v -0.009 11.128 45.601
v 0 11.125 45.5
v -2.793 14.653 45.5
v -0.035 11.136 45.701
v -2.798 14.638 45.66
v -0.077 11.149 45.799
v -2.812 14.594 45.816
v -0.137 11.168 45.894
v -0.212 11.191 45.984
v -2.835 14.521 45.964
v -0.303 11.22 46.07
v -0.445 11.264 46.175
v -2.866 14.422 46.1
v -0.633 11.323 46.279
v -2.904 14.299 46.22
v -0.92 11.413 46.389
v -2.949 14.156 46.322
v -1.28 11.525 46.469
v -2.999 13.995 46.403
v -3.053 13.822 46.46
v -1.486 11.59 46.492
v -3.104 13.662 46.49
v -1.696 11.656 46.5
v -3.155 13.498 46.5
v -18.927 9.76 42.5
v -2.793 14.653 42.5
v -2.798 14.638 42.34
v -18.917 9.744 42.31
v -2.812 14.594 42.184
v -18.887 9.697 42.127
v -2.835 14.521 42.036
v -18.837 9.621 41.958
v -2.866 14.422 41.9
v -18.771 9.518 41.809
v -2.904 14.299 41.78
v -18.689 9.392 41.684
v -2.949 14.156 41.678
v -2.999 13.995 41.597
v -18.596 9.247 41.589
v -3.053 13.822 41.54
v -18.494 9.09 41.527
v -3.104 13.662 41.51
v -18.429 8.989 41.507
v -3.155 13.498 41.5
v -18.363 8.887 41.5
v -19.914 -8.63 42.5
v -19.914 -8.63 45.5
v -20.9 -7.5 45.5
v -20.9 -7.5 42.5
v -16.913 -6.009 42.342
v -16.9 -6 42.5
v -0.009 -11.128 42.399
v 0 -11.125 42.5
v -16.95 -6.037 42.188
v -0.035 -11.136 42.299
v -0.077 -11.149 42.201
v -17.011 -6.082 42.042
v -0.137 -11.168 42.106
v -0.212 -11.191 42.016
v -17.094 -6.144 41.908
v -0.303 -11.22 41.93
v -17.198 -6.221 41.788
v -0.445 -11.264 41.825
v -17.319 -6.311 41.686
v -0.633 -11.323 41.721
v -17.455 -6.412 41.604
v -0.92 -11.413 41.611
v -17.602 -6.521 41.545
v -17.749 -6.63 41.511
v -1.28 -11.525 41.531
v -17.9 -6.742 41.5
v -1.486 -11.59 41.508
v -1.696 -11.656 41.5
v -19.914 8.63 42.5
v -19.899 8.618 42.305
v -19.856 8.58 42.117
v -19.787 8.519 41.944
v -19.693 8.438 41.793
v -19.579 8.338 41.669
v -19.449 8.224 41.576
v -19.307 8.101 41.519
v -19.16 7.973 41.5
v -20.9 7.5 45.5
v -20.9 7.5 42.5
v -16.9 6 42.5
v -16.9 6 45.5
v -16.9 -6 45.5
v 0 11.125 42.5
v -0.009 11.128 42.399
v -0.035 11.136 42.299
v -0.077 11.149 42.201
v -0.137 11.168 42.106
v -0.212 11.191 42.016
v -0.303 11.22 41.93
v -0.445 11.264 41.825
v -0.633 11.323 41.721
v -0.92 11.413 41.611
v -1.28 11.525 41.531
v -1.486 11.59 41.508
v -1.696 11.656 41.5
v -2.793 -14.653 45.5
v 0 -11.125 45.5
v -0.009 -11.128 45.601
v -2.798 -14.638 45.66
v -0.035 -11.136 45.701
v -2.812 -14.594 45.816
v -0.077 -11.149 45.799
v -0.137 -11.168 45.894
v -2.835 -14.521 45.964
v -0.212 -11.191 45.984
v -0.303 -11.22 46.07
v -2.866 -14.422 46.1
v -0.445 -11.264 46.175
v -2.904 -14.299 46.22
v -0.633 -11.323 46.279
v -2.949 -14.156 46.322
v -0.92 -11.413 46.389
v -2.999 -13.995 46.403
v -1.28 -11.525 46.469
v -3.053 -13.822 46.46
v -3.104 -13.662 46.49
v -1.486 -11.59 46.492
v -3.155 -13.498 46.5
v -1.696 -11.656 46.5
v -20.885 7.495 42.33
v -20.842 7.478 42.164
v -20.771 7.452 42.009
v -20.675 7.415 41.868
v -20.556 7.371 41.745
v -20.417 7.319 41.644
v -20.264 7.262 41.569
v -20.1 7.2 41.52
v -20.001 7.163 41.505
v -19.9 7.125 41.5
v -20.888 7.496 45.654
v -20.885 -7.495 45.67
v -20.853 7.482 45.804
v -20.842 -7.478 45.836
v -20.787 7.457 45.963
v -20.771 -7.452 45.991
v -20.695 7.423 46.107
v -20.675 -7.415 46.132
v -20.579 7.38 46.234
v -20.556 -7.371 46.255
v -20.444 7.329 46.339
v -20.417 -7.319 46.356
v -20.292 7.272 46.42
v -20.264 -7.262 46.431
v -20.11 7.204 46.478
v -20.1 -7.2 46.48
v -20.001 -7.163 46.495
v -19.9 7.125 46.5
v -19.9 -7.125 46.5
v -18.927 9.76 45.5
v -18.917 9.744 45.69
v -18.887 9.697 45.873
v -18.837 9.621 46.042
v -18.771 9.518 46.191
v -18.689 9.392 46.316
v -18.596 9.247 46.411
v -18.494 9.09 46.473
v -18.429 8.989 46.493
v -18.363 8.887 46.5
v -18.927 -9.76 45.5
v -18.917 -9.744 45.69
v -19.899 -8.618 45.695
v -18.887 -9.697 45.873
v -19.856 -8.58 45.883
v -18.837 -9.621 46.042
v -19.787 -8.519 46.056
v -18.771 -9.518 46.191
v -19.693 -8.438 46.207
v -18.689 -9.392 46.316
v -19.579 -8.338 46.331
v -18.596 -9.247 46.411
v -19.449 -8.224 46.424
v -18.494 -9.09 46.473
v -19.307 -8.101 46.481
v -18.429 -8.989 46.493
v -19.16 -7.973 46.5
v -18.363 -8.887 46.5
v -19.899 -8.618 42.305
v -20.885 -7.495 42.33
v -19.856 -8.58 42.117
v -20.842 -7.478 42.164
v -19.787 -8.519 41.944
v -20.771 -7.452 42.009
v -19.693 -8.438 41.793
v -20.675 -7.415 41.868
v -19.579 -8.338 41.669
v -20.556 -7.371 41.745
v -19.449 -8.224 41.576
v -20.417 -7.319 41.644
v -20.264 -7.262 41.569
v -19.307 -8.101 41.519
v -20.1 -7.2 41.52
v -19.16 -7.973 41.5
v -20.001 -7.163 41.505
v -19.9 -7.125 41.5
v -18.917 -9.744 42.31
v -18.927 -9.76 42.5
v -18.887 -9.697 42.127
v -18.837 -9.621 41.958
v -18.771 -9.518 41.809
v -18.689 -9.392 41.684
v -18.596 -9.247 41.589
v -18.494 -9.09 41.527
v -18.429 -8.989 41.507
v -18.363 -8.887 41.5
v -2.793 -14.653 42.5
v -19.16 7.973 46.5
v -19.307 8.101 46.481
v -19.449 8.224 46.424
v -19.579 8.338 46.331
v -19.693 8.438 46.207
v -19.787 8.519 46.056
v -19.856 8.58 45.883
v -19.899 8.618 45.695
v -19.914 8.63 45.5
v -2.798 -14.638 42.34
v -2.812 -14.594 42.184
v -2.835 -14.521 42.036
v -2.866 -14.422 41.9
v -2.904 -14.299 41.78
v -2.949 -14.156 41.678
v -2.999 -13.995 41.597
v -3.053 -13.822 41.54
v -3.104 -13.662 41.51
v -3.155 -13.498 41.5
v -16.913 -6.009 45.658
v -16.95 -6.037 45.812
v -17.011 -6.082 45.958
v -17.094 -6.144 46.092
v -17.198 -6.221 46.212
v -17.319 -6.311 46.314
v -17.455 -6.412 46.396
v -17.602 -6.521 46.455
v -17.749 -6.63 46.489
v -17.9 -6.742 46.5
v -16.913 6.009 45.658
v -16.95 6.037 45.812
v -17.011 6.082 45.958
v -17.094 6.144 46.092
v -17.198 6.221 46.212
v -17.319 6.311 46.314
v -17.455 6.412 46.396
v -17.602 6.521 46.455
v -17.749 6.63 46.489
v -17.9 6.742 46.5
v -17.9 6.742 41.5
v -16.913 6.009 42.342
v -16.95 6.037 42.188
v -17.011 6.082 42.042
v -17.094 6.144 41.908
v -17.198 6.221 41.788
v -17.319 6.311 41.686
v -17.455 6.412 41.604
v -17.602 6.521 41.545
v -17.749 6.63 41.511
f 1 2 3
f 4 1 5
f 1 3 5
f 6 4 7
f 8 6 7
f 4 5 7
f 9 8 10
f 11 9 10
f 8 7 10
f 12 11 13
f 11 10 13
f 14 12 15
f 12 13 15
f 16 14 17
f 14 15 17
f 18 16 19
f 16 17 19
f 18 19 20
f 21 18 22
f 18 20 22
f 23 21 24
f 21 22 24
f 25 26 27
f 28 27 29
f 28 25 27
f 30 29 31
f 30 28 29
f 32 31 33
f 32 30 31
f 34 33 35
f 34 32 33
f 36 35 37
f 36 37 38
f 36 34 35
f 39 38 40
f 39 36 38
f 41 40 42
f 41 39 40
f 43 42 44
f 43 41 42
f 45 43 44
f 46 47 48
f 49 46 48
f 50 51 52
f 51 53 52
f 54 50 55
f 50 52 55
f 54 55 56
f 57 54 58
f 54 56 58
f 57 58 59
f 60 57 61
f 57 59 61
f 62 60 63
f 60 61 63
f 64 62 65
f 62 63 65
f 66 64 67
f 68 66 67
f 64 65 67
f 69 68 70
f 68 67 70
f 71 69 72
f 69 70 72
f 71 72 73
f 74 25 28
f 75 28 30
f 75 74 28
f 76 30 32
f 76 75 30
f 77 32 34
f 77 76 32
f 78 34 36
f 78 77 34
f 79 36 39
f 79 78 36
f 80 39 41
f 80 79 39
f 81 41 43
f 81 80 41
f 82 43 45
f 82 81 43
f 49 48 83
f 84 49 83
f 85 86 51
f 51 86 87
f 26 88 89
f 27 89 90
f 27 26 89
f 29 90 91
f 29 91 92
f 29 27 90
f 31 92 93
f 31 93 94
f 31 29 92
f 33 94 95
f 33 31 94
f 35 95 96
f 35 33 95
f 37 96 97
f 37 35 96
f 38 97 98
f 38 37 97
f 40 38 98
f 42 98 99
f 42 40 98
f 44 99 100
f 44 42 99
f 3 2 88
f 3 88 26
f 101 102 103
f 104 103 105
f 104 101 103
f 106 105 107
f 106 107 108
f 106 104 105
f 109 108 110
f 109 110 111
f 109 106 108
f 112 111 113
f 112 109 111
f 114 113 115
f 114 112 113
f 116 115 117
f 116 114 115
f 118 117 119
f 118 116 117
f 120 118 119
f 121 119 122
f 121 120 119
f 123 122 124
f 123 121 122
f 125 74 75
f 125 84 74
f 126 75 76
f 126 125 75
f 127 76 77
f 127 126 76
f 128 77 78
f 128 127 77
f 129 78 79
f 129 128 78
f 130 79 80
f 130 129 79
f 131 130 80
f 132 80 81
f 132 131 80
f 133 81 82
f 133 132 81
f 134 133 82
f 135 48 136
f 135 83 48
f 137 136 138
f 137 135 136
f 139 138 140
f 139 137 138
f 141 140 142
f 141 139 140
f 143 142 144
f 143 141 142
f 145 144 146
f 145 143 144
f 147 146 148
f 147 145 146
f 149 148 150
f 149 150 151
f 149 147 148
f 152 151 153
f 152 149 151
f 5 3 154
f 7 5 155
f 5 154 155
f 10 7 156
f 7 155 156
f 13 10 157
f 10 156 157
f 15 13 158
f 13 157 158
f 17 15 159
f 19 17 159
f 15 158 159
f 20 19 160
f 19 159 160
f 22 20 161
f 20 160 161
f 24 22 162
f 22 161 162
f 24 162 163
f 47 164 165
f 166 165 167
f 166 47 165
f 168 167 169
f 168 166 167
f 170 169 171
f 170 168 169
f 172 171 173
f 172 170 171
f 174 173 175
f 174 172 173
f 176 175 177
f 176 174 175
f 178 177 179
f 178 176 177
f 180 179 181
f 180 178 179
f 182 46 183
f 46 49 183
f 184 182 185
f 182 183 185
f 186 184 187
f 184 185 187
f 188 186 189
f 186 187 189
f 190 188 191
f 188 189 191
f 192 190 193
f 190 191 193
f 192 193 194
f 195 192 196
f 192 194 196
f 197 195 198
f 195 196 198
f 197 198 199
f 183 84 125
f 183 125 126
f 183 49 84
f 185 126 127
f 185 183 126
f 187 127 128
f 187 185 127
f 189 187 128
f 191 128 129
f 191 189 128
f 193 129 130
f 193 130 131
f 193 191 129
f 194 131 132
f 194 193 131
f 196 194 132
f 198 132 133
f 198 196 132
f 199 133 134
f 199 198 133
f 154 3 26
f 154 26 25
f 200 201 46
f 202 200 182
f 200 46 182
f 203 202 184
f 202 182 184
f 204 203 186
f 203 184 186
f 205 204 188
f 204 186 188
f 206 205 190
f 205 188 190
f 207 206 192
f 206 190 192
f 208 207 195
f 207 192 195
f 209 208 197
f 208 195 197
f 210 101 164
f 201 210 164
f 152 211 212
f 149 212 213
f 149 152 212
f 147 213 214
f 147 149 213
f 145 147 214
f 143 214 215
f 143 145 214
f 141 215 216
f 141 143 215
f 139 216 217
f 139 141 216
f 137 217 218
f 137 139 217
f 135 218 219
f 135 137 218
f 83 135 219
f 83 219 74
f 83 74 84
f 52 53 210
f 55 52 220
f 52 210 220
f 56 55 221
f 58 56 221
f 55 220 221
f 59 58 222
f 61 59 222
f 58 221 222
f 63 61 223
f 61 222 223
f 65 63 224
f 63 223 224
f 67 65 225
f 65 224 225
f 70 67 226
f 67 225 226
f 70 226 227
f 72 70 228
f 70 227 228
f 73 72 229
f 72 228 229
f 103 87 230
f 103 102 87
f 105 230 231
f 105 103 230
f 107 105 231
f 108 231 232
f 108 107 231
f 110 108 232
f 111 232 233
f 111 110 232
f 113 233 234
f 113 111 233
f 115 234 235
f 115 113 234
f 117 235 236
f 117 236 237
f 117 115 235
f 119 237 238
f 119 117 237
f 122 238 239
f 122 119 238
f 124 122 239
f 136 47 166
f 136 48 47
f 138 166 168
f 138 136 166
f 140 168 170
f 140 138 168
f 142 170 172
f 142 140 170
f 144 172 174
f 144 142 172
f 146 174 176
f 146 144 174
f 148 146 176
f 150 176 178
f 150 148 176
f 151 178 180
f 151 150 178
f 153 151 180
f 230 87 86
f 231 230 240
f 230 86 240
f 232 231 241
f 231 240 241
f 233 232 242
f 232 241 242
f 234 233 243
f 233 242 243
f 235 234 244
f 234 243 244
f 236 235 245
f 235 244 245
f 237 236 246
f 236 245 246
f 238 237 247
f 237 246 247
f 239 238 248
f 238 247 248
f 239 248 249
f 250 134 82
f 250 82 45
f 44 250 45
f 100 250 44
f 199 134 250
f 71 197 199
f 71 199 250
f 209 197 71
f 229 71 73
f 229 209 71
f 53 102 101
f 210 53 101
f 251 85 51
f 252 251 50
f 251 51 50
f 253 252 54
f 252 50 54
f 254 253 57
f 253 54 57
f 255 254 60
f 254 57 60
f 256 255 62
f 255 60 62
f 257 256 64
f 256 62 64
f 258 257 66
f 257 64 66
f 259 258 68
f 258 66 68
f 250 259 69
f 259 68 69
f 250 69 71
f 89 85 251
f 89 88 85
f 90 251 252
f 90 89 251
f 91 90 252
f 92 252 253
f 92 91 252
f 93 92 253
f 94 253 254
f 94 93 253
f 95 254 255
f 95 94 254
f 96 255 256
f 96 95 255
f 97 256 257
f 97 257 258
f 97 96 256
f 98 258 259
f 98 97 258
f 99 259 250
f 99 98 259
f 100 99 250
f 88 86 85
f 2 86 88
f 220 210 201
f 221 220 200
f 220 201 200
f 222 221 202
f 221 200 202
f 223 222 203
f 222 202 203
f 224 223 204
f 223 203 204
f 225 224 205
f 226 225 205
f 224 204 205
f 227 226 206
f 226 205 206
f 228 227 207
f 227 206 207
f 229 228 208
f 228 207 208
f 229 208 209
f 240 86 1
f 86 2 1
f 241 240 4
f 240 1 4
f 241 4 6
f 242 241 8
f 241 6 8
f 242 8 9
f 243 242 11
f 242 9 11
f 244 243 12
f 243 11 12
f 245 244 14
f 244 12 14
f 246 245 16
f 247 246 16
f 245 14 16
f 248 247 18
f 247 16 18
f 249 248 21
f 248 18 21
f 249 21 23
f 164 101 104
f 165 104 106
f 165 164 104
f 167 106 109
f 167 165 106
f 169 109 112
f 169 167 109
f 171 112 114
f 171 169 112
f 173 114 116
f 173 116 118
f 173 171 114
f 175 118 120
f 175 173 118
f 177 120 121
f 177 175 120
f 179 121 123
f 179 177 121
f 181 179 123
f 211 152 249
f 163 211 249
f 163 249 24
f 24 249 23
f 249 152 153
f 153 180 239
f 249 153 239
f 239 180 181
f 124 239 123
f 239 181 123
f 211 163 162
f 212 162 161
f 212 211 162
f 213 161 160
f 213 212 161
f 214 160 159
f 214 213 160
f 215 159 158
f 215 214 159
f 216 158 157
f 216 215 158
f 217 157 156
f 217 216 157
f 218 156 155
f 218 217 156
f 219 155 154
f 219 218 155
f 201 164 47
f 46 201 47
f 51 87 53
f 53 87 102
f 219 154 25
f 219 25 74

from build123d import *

# Parameters (mm, degrees)
F2_DEPTH      = 2.5
F2_DEPTH_BACK = 2.5
F4_R          = 1


with BuildPart() as f2:
    # F1 (on offset) → F2 (new body, two sides)
    with BuildSketch(Plane.XY.offset(44)) as f2_sk:
        Polygon((-20.9, 0), (-16.9, 0), (-16.9, 6), (0, 11.1249185786), (-2.7934713079, 14.6528808873), (-18.9273972603, 9.7602739726), (-19.9136986301, 8.6301369863), (-20.9, 7.5), align=None)
    extrude(amount=F2_DEPTH)
    extrude(f2_sk.sketch, amount=-F2_DEPTH_BACK)

    # F3: F2 across plane


with BuildPart() as f2_1:
    add(f2.part)
    add(f2.part.mirror(Plane.XZ))

    # F4
    f4_edges = [f2_1.edges().sort_by_distance(p)[0] for p in [
        (-16.9, 0, 46.5),
        (-8.45, 8.562459, 46.5),
        (-1.396736, 12.8889, 46.5),
        (-10.860434, 12.206577, 46.5),
        (-19.913699, 8.630137, 46.5),
        (-20.9, 0, 46.5),
        (-19.913699, -8.630137, 46.5),
        (-10.860434, -12.206577, 46.5),
        (-1.396736, -12.8889, 46.5),
        (-8.45, -8.562459, 46.5),
        (-16.9, 0, 41.5),
        (-8.45, 8.562459, 41.5),
        (-1.396736, 12.8889, 41.5),
        (-10.860434, 12.206577, 41.5),
        (-19.913699, 8.630137, 41.5),
        (-20.9, 0, 41.5),
        (-19.913699, -8.630137, 41.5),
        (-10.860434, -12.206577, 41.5),
        (-1.396736, -12.8889, 41.5),
        (-8.45, -8.562459, 41.5),
    ]]
    fillet(f4_edges, radius=F4_R)


solid = f2_1.part
